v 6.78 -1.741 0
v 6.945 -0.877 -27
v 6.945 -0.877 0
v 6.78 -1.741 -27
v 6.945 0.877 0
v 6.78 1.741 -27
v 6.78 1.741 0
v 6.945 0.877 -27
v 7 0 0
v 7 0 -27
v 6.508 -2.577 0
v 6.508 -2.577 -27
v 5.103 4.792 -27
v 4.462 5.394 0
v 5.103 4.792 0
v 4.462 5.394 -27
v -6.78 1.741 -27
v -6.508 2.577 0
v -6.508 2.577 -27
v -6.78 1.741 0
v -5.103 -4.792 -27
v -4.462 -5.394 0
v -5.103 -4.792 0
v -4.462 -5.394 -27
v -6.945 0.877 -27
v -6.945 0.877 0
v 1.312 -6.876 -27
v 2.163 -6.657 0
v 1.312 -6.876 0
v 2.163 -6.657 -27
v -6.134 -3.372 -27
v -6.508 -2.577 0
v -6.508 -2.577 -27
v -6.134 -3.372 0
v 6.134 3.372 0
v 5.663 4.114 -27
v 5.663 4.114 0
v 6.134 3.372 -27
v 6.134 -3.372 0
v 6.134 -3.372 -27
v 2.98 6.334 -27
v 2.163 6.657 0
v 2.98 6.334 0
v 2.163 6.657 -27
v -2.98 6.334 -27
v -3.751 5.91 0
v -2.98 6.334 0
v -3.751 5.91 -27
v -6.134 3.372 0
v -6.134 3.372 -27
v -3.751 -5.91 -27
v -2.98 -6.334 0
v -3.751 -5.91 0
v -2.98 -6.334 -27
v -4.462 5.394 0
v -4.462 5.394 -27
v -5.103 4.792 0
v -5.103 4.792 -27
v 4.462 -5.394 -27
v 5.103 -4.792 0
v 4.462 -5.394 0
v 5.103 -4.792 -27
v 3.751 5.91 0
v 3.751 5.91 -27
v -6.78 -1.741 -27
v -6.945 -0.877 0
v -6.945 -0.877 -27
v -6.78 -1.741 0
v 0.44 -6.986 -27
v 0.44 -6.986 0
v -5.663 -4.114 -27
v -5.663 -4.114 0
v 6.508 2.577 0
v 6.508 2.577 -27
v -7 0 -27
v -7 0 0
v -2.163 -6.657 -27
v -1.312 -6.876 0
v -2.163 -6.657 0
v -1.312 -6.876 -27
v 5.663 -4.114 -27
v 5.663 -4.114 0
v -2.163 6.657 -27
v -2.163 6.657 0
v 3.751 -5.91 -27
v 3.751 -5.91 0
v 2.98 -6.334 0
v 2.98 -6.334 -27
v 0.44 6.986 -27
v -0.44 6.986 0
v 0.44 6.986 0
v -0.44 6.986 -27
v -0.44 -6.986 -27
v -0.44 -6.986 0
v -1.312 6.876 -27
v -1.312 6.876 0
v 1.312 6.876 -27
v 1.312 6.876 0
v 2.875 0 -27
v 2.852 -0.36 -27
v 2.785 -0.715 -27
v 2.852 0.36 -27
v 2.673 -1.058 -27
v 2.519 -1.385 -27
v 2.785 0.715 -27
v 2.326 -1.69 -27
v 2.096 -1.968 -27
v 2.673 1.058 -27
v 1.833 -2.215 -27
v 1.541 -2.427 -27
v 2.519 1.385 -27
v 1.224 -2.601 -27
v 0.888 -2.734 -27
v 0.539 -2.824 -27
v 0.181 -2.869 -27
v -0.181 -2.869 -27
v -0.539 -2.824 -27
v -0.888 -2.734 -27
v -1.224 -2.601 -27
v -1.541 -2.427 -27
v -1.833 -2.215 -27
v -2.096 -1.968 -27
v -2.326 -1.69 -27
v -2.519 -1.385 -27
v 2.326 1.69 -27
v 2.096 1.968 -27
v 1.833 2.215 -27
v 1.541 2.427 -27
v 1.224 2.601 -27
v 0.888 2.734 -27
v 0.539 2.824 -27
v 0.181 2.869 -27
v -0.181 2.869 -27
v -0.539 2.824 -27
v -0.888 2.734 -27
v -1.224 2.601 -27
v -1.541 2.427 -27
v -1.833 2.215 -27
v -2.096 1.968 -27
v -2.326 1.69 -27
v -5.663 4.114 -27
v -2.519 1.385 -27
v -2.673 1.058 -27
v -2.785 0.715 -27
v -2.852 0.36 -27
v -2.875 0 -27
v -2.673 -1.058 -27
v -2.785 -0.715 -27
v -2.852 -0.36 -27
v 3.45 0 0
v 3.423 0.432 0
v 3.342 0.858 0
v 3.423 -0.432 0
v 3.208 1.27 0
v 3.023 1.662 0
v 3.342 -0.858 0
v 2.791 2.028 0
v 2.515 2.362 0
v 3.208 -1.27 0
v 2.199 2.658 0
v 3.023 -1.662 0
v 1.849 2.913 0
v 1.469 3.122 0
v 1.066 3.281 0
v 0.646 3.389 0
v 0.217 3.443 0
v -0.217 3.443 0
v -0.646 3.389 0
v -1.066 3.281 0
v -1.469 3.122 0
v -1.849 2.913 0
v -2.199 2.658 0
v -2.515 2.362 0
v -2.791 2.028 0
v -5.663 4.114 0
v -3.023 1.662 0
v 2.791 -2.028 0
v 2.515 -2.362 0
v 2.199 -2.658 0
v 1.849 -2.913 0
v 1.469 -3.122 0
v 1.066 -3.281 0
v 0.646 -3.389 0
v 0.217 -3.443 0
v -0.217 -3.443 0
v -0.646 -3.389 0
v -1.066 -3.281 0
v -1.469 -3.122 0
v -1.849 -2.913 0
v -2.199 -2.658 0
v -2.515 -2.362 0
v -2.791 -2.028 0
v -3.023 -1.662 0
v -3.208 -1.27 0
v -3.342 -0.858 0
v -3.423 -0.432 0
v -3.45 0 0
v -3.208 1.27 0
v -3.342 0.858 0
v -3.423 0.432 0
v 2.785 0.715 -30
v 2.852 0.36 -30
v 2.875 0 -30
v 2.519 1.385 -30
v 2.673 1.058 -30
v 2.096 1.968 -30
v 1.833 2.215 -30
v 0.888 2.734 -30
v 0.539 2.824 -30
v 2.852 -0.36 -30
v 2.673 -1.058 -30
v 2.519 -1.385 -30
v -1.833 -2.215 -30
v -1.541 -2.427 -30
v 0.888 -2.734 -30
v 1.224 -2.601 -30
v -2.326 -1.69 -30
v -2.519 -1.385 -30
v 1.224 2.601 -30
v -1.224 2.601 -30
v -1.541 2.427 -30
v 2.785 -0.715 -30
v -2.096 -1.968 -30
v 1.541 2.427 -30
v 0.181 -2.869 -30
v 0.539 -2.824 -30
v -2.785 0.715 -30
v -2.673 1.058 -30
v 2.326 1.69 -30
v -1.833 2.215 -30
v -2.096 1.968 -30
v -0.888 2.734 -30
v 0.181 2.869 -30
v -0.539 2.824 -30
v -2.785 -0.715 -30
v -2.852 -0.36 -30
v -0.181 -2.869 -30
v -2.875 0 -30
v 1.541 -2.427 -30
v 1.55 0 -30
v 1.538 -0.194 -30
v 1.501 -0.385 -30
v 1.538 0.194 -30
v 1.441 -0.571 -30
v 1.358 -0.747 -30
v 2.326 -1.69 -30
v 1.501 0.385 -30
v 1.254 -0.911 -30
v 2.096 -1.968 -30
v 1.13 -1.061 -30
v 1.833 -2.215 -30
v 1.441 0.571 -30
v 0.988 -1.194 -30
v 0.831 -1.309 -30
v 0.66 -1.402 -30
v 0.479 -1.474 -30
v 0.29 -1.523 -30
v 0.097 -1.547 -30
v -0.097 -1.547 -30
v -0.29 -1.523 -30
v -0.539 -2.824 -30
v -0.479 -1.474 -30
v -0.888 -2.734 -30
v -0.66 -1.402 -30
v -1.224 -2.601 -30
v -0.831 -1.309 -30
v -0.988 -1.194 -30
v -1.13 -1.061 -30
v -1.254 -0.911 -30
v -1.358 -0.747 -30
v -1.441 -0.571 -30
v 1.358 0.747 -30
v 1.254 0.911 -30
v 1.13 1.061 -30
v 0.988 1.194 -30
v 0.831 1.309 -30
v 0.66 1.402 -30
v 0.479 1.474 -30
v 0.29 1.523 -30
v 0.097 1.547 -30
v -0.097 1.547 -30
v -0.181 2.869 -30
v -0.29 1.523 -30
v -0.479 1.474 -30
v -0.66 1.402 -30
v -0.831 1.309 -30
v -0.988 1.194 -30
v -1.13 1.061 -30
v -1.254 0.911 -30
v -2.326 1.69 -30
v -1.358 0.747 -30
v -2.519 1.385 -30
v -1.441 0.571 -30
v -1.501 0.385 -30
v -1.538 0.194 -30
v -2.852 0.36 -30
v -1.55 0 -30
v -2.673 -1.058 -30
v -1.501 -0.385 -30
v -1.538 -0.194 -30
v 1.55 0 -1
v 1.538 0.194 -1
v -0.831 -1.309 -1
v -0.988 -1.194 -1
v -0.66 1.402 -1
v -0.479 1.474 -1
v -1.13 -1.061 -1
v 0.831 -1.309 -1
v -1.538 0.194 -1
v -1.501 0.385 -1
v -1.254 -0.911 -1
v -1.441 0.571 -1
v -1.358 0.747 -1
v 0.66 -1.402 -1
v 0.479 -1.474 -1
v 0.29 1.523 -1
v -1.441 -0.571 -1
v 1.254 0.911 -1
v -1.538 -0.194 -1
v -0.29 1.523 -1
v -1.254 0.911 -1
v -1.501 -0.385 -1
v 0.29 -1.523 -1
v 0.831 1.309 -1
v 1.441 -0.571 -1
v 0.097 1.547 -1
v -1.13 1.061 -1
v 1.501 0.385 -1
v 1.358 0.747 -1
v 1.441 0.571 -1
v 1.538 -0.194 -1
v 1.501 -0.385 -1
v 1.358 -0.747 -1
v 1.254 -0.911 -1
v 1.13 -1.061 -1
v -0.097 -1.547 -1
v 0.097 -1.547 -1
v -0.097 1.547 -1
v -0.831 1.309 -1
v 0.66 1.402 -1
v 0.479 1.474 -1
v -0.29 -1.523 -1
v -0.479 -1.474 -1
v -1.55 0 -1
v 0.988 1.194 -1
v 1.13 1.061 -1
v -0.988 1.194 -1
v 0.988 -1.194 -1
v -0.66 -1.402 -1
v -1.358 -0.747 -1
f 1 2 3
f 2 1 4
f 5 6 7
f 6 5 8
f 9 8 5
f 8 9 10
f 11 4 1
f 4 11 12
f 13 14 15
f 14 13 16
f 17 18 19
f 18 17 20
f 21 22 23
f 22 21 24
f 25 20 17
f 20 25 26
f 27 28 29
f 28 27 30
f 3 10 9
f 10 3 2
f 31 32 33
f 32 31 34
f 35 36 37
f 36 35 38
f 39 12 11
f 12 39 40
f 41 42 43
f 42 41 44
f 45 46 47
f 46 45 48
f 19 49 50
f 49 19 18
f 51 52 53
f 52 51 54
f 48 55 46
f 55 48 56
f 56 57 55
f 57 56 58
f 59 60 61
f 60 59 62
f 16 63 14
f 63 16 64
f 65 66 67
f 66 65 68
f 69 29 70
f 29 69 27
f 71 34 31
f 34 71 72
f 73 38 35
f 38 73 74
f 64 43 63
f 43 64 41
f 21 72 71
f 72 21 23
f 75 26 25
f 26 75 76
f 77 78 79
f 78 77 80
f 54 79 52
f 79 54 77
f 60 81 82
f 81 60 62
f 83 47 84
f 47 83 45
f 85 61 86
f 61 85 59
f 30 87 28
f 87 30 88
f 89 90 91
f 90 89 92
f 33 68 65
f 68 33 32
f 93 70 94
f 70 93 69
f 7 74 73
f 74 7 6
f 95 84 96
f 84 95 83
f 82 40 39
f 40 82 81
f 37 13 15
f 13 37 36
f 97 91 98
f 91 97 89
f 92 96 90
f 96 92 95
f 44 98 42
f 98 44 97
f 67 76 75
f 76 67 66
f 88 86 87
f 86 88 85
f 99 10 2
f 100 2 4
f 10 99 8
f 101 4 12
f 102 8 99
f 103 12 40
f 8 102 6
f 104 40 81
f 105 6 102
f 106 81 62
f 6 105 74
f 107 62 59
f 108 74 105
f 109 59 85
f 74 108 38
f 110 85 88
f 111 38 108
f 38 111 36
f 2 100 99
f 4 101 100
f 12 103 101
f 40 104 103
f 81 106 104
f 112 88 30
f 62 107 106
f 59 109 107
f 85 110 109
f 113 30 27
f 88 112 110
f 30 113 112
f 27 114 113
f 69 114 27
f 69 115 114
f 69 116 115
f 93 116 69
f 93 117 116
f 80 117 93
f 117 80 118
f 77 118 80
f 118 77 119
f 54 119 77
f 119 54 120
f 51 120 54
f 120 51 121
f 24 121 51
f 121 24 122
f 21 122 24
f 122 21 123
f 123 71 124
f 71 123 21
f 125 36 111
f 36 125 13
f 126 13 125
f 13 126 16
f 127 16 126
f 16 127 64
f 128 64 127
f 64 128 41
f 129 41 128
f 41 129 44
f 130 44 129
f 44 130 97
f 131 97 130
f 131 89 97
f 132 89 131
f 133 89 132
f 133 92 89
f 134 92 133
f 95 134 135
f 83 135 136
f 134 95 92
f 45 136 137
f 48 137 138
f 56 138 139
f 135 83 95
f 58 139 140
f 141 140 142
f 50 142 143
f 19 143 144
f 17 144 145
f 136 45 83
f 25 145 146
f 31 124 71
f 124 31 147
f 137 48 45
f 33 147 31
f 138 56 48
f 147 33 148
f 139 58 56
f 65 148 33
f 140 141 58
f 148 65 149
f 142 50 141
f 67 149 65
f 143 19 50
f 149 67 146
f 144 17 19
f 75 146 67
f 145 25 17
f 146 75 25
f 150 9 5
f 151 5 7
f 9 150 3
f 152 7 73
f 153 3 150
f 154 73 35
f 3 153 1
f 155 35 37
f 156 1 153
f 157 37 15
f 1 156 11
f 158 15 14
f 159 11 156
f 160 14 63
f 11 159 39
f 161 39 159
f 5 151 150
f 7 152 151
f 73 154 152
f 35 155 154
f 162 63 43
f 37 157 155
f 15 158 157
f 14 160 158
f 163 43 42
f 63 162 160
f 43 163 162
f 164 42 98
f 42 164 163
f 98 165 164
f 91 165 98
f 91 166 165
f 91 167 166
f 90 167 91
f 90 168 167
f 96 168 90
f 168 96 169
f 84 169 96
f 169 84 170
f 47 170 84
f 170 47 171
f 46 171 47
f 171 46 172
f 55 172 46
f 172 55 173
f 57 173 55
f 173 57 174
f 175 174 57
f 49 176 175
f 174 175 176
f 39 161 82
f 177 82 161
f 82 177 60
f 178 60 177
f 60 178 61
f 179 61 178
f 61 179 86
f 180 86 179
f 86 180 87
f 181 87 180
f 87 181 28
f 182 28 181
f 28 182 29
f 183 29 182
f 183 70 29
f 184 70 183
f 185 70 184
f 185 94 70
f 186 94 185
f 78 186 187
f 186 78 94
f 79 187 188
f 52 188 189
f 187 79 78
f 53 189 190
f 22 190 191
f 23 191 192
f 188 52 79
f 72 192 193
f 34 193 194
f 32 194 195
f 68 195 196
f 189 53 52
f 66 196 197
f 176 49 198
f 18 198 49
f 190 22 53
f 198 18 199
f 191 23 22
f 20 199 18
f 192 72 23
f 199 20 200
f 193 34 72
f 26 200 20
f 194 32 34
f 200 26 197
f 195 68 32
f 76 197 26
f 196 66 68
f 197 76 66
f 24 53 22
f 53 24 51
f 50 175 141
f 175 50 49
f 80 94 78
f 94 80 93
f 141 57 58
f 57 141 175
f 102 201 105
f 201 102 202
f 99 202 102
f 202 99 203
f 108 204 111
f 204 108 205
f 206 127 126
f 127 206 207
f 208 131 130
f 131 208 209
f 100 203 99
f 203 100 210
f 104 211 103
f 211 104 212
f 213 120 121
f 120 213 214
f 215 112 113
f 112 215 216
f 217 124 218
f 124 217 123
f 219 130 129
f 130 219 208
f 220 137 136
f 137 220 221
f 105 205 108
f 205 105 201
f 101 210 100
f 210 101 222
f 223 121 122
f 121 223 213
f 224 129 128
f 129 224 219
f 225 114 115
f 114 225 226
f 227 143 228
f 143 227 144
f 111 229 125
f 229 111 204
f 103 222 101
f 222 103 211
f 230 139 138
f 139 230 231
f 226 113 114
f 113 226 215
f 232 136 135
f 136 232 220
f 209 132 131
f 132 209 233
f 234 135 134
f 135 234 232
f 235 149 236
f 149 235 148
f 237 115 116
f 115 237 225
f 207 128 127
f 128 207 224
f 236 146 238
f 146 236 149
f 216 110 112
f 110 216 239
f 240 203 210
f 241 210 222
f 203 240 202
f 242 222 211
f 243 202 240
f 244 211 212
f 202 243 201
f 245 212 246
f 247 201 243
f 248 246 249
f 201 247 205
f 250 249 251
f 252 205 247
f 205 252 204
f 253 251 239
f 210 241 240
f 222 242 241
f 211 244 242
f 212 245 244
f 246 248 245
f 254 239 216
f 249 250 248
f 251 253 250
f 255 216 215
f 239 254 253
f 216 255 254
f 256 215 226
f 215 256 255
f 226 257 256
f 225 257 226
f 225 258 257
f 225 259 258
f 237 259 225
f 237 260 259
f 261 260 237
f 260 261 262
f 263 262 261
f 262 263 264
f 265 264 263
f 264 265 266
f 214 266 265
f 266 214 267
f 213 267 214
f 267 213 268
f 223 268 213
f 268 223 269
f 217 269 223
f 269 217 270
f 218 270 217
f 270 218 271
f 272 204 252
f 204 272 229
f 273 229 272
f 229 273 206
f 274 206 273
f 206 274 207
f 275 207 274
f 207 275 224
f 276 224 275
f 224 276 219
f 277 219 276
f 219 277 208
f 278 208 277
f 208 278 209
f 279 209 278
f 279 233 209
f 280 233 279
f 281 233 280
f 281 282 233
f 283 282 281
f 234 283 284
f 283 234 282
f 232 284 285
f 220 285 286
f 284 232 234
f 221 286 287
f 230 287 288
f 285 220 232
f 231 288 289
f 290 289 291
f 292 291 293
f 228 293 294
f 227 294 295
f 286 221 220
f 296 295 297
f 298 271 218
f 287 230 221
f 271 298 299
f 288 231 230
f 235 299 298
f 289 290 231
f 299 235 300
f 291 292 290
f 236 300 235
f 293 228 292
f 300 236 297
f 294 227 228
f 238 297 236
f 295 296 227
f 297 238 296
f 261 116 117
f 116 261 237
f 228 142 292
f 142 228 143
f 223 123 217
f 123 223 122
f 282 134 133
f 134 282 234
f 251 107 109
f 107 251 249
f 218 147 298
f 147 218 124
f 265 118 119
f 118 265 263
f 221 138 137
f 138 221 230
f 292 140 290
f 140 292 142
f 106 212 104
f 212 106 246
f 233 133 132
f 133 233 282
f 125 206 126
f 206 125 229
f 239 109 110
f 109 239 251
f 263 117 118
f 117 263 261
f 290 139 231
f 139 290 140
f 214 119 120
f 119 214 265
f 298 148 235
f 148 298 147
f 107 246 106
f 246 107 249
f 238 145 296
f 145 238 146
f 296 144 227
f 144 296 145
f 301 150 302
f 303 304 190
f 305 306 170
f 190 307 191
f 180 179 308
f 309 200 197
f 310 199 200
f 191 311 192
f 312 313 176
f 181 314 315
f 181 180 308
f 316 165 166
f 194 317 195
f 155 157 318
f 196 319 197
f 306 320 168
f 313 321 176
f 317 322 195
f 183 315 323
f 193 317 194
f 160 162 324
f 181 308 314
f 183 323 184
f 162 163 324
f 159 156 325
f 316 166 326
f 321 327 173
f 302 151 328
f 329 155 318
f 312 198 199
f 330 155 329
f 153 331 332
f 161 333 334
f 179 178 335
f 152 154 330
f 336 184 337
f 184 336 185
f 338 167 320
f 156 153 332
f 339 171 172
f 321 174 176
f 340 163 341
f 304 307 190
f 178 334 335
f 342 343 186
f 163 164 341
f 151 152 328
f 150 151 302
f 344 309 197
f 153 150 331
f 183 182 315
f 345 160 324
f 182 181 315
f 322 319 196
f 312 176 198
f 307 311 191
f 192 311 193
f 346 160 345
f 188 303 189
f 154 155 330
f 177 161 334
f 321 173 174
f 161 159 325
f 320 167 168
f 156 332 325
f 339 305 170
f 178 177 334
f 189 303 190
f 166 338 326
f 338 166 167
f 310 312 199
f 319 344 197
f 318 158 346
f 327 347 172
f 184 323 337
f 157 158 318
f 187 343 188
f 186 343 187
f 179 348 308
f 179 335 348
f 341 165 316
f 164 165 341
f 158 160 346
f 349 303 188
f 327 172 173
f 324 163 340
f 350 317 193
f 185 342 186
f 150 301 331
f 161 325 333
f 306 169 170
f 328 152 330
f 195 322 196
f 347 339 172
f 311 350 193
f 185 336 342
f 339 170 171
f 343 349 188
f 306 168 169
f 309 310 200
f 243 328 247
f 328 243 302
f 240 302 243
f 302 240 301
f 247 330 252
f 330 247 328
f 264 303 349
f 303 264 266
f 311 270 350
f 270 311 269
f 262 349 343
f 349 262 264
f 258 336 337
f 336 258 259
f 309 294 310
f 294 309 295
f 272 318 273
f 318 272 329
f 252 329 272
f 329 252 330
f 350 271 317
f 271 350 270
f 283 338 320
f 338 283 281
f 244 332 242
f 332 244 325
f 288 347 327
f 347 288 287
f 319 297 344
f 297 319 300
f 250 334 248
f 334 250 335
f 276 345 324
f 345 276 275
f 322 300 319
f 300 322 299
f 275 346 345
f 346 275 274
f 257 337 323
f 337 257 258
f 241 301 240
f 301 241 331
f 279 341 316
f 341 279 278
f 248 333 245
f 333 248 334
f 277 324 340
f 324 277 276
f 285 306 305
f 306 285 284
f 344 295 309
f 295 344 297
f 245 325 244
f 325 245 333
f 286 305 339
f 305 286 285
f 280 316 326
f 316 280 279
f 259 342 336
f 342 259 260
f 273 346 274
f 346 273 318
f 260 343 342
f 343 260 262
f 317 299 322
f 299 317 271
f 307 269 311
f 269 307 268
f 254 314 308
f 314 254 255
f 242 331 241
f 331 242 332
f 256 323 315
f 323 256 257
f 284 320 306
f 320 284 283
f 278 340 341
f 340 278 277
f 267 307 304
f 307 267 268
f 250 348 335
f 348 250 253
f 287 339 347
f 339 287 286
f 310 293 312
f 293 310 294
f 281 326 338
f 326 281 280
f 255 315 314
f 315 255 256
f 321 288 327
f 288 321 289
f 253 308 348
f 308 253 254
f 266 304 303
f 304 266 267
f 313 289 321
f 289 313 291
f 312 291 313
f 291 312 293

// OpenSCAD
$fn = 50;

difference() {
	union() {
		translate(v = [0, 0, -27.0]) {
			cylinder(h = 27, r = 7.0);
		}
		#translate(v = [0, 0, -30.0]) {
			cylinder(h = 30, r = 2.875);
		}
	}
	union() {
		translate(v = [0, 0, 0]) {
			rotate(a = [0, 0, 0]) {
				difference() {
					union() {
						translate(v = [0, 0, -30.0]) {
							cylinder(h = 30, r = 1.25);
						}
						translate(v = [0, 0, -1.0]) {
							cylinder(h = 1.0, r1 = 1.55, r2 = 3.45);
						}
						translate(v = [0, 0, -30.0]) {
							cylinder(h = 30, r = 1.55);
						}
						translate(v = [0, 0, -30.0]) {
							cylinder(h = 30, r = 1.25);
						}
					}
					union();
				}
			}
		}
	}
}
